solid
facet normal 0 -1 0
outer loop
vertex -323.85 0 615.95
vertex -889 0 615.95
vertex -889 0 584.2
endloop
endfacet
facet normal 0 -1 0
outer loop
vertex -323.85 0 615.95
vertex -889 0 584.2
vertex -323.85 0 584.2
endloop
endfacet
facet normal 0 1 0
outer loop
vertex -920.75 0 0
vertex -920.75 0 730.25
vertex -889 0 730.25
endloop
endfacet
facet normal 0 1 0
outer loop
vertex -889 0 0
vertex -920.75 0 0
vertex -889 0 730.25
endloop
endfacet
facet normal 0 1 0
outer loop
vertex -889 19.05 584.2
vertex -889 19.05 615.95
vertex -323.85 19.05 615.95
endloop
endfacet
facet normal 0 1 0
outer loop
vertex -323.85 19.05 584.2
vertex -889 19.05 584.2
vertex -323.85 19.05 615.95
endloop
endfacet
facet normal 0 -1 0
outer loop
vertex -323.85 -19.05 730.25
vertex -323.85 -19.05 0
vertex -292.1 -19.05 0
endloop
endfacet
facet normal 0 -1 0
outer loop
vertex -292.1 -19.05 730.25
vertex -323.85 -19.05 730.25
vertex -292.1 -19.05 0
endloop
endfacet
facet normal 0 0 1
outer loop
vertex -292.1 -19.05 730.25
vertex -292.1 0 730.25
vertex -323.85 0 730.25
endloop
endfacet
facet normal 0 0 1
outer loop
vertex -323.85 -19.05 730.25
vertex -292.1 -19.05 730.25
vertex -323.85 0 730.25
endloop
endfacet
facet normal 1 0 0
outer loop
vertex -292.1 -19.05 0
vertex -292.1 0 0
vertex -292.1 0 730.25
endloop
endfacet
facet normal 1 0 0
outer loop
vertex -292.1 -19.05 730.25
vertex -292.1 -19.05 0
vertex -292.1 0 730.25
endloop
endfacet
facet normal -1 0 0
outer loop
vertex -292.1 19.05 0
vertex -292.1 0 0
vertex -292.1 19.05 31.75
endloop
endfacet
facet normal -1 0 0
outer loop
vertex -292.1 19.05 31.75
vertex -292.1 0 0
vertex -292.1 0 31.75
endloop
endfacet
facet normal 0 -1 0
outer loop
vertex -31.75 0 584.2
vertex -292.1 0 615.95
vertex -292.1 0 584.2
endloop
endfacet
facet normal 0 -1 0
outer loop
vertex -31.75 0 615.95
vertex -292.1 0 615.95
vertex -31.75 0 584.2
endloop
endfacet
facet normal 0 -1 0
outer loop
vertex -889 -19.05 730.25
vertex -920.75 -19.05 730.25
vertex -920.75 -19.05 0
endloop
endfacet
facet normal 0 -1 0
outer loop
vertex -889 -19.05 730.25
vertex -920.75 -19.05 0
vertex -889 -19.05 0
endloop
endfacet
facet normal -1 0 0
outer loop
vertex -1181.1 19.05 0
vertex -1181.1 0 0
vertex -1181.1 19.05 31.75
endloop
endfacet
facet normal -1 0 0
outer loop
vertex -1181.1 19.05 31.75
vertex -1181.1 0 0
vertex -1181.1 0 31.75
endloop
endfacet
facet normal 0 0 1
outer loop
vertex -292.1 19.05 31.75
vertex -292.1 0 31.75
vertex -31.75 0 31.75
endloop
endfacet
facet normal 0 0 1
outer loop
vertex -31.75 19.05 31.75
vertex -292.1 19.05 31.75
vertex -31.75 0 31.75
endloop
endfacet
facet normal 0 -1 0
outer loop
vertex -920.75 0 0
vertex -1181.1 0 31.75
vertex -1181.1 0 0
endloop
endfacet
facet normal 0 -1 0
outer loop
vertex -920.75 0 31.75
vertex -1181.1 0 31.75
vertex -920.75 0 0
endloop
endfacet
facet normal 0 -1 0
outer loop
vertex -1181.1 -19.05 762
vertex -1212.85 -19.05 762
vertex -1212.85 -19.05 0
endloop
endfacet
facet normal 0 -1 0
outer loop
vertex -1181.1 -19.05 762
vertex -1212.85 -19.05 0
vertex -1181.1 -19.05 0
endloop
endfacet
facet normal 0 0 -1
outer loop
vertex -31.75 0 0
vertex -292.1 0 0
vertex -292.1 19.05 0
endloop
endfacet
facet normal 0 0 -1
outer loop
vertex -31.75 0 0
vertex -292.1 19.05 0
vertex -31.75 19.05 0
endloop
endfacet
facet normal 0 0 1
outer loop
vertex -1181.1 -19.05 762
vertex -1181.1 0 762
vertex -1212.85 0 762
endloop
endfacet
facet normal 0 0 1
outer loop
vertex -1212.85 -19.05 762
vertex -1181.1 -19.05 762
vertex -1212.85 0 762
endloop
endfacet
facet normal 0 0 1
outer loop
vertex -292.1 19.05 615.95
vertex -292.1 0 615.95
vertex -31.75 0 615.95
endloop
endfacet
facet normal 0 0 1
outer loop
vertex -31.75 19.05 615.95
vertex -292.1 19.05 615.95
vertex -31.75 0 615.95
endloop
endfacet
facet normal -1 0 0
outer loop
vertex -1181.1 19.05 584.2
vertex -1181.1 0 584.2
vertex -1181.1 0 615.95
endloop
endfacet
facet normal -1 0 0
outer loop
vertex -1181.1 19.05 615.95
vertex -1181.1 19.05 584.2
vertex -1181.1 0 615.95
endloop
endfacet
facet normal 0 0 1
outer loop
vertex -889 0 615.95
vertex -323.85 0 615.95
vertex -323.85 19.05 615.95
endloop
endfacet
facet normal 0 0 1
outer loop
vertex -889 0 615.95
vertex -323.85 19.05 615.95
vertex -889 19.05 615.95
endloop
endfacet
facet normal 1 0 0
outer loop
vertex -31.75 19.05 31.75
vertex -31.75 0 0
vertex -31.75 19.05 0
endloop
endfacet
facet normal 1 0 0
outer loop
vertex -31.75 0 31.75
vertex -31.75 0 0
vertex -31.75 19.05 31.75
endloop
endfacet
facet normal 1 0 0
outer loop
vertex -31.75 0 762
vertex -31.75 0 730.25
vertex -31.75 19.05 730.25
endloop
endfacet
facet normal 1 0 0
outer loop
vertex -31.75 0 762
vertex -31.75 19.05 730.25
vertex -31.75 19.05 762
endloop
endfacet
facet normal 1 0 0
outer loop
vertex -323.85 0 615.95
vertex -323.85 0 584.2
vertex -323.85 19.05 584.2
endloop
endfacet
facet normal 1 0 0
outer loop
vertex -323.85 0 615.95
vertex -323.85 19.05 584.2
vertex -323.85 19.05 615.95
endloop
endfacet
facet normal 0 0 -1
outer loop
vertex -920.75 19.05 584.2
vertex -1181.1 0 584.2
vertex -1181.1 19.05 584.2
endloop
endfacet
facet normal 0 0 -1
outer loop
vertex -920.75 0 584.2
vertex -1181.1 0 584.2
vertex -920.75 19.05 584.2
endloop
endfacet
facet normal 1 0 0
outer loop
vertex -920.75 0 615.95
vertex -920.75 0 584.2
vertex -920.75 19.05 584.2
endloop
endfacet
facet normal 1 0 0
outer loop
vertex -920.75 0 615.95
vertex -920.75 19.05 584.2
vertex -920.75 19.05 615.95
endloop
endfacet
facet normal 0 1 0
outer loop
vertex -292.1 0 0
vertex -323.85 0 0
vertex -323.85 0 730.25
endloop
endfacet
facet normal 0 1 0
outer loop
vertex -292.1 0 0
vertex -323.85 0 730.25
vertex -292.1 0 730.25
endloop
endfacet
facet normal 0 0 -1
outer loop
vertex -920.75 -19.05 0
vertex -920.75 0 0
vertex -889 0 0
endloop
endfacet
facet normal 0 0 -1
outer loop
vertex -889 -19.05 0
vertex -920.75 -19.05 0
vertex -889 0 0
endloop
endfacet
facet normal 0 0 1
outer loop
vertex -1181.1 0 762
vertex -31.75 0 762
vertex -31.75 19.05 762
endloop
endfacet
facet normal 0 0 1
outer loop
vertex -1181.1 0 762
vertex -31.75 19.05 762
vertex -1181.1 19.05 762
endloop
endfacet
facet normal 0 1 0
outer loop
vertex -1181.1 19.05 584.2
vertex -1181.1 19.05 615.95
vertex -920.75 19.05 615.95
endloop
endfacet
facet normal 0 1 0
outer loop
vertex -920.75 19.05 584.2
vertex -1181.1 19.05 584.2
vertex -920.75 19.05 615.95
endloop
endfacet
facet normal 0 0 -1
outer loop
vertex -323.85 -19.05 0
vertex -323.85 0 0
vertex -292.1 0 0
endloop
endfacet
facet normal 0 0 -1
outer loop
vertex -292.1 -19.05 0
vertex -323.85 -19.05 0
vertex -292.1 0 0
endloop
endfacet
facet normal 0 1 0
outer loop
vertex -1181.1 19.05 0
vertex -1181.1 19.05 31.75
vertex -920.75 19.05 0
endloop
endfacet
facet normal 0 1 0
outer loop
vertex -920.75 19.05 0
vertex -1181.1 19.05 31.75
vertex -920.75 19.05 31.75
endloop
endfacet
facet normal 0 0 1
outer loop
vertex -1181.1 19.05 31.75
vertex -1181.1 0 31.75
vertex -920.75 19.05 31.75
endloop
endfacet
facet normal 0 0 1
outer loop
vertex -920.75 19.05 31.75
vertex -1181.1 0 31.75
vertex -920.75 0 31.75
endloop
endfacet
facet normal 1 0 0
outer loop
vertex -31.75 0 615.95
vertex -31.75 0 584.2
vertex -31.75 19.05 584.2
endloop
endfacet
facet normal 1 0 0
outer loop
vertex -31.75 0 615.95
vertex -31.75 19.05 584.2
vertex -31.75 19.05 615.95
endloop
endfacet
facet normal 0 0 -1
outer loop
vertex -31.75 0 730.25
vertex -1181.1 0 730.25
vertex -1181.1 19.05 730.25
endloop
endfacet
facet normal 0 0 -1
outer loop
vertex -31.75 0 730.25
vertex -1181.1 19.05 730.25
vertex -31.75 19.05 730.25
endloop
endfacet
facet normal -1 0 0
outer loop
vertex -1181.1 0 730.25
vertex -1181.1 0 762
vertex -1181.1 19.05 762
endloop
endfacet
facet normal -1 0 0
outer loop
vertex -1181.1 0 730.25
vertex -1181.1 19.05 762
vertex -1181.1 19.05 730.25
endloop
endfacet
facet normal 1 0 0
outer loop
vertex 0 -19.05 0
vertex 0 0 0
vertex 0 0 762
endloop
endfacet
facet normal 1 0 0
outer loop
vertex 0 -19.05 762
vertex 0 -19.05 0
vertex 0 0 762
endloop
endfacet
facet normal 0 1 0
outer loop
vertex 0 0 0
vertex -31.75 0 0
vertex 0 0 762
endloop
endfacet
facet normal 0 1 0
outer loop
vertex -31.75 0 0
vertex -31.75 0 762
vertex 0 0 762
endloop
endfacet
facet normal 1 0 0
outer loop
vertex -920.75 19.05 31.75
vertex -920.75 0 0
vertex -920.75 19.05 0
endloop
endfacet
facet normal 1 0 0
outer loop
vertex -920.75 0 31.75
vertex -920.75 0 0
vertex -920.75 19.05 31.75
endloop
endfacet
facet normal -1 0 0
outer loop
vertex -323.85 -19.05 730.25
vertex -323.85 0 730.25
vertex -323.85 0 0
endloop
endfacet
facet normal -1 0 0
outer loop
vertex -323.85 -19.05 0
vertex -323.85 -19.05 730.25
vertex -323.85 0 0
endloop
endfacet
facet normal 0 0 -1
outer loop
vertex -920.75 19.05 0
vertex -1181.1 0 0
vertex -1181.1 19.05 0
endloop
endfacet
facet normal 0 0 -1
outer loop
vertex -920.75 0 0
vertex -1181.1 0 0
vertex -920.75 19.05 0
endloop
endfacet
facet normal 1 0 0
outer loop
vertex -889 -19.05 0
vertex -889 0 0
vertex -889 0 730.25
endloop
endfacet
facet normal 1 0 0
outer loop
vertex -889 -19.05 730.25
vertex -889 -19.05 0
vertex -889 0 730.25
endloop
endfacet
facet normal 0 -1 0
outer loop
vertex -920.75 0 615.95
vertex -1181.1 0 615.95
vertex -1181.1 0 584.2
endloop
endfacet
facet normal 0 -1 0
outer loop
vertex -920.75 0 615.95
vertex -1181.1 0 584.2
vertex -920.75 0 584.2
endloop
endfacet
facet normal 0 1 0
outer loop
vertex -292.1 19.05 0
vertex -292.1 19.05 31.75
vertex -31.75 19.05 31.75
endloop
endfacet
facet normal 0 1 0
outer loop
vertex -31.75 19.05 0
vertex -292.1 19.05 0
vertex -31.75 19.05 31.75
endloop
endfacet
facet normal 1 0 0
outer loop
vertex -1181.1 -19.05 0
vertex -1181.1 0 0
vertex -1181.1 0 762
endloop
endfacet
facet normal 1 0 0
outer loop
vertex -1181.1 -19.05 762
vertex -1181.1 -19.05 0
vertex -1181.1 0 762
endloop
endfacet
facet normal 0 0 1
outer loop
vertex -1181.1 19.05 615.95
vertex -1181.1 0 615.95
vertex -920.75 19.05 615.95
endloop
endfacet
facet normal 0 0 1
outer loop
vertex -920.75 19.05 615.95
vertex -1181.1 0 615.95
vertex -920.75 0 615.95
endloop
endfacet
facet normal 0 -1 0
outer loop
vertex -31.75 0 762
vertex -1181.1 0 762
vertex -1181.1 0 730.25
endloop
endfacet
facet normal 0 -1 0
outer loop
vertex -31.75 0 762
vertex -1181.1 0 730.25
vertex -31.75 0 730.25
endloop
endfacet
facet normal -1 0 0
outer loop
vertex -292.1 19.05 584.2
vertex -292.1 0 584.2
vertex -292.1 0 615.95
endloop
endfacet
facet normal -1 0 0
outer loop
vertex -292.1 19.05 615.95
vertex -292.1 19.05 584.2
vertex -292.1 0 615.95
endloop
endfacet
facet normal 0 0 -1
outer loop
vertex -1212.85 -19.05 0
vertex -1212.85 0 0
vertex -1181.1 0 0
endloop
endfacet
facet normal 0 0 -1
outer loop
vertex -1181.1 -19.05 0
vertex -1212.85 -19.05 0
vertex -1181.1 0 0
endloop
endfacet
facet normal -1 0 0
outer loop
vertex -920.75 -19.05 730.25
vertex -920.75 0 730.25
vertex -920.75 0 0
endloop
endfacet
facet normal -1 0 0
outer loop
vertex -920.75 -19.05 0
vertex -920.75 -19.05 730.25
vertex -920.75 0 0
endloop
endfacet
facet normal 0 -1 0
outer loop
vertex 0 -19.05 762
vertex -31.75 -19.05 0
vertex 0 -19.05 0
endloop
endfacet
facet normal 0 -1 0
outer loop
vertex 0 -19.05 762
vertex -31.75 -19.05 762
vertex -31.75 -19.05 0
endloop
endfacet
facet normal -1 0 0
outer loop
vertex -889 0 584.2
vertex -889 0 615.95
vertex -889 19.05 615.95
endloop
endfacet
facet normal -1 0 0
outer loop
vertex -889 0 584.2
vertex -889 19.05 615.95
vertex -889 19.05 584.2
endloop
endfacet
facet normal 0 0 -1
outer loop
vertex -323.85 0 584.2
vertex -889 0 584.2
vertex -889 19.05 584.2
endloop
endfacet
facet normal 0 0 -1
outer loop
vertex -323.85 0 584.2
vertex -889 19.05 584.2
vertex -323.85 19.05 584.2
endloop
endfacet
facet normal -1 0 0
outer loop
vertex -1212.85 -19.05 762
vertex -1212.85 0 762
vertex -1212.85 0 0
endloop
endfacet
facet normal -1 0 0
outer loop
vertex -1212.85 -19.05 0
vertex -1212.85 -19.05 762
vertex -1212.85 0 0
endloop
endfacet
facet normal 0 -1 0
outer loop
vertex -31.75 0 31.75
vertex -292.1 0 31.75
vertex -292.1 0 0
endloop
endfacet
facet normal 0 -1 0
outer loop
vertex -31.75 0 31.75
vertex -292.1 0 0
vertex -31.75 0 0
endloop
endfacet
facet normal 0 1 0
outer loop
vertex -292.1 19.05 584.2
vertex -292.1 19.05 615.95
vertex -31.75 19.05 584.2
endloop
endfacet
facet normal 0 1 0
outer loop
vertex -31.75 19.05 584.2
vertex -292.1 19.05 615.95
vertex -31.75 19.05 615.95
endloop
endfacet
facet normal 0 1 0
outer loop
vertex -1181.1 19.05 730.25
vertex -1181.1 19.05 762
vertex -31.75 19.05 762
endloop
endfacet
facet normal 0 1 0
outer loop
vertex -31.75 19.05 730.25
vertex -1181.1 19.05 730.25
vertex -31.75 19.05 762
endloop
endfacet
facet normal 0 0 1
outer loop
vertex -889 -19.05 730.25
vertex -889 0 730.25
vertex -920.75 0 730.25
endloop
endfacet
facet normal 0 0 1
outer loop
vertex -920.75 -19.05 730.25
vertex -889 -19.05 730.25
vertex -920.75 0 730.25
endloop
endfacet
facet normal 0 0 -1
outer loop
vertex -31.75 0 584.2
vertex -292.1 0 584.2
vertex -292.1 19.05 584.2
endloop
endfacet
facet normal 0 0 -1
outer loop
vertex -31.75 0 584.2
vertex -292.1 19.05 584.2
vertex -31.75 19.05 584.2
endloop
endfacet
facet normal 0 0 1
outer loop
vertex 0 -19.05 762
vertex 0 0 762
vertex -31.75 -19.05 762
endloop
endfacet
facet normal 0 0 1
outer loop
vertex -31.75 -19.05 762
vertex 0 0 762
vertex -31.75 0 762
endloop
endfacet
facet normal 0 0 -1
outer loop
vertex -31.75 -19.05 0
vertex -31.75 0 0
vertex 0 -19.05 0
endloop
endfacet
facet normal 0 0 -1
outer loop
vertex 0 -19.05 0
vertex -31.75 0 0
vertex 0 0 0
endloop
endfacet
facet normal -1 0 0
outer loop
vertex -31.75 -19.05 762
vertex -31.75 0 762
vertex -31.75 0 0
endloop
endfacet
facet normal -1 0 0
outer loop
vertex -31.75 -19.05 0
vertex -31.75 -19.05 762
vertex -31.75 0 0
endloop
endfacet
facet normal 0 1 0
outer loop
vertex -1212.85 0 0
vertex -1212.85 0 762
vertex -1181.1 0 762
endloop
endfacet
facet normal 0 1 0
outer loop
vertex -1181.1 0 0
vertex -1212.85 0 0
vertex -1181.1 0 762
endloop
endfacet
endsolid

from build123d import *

# Parameters (mm, degrees)
F1_DEPTH = 19.05
F0_W     = 260.349978
F0_H     = 31.75
F0_W_2   = 260.35
F2_DEPTH = 19.05


with BuildPart() as f1:
    # F0 (on Front) → F1 (new body)
    with BuildSketch(Plane.XZ):
        Polygon((-1181.1, 730.25), (-1181.1, 762), (-1212.85, 762), (-1212.85, 0), (-1181.1, 0), (-1181.1, 31.75), (-1181.1, 584.2), (-1181.1, 615.95), align=None)
        Polygon((-888.999999, 730.25), (-920.750022, 730.25), (-920.750022, 615.95), (-920.750022, 584.2), (-920.750022, 31.75), (-920.750022, 0), (-888.999999, 0), (-888.999999, 31.75), (-888.999999, 584.2), (-888.999999, 615.95), align=None)
        Polygon((-323.85, 0), (-292.1, 0), (-292.1, 31.75), (-292.1, 584.2), (-292.1, 615.95), (-292.1, 730.25), (-323.85, 730.25), (-323.85, 615.95), (-323.85, 584.2), (-323.85, 31.75), align=None)
        Polygon((-31.75, 0), (0, 0), (0, 762), (-31.75, 762), (-31.75, 730.25), (-31.75, 615.95), (-31.75, 584.2), (-31.75, 31.75), align=None)
    extrude(amount=F1_DEPTH)


with BuildPart() as f2:
    # F0 (on Front) → F2 (new body)
    with BuildSketch(Plane.XZ):
        with Locations((-1050.925011, 15.875)):
            Rectangle(F0_W, F0_H)
        with Locations((-161.925, 15.875)):
            Rectangle(F0_W_2, F0_H)
        Polygon((-330.2, 584.2), (-323.85, 584.2), (-323.85, 615.95), (-330.2, 615.95), (-882.65, 615.95), (-888.999999, 615.95), (-888.999999, 584.2), (-882.65, 584.2), align=None)
        with Locations((-1050.925011, 600.075)):
            Rectangle(F0_W, F0_H)
        Polygon((-31.75, 730.25), (-31.75, 762), (-1181.1, 762), (-1181.1, 730.25), (-920.750022, 730.25), (-888.999999, 730.25), (-323.85, 730.25), (-292.1, 730.25), align=None)
        with Locations((-161.925, 600.075)):
            Rectangle(F0_W_2, F0_H)
    extrude(amount=-F2_DEPTH)


solid = Compound([f1.part, f2.part])
